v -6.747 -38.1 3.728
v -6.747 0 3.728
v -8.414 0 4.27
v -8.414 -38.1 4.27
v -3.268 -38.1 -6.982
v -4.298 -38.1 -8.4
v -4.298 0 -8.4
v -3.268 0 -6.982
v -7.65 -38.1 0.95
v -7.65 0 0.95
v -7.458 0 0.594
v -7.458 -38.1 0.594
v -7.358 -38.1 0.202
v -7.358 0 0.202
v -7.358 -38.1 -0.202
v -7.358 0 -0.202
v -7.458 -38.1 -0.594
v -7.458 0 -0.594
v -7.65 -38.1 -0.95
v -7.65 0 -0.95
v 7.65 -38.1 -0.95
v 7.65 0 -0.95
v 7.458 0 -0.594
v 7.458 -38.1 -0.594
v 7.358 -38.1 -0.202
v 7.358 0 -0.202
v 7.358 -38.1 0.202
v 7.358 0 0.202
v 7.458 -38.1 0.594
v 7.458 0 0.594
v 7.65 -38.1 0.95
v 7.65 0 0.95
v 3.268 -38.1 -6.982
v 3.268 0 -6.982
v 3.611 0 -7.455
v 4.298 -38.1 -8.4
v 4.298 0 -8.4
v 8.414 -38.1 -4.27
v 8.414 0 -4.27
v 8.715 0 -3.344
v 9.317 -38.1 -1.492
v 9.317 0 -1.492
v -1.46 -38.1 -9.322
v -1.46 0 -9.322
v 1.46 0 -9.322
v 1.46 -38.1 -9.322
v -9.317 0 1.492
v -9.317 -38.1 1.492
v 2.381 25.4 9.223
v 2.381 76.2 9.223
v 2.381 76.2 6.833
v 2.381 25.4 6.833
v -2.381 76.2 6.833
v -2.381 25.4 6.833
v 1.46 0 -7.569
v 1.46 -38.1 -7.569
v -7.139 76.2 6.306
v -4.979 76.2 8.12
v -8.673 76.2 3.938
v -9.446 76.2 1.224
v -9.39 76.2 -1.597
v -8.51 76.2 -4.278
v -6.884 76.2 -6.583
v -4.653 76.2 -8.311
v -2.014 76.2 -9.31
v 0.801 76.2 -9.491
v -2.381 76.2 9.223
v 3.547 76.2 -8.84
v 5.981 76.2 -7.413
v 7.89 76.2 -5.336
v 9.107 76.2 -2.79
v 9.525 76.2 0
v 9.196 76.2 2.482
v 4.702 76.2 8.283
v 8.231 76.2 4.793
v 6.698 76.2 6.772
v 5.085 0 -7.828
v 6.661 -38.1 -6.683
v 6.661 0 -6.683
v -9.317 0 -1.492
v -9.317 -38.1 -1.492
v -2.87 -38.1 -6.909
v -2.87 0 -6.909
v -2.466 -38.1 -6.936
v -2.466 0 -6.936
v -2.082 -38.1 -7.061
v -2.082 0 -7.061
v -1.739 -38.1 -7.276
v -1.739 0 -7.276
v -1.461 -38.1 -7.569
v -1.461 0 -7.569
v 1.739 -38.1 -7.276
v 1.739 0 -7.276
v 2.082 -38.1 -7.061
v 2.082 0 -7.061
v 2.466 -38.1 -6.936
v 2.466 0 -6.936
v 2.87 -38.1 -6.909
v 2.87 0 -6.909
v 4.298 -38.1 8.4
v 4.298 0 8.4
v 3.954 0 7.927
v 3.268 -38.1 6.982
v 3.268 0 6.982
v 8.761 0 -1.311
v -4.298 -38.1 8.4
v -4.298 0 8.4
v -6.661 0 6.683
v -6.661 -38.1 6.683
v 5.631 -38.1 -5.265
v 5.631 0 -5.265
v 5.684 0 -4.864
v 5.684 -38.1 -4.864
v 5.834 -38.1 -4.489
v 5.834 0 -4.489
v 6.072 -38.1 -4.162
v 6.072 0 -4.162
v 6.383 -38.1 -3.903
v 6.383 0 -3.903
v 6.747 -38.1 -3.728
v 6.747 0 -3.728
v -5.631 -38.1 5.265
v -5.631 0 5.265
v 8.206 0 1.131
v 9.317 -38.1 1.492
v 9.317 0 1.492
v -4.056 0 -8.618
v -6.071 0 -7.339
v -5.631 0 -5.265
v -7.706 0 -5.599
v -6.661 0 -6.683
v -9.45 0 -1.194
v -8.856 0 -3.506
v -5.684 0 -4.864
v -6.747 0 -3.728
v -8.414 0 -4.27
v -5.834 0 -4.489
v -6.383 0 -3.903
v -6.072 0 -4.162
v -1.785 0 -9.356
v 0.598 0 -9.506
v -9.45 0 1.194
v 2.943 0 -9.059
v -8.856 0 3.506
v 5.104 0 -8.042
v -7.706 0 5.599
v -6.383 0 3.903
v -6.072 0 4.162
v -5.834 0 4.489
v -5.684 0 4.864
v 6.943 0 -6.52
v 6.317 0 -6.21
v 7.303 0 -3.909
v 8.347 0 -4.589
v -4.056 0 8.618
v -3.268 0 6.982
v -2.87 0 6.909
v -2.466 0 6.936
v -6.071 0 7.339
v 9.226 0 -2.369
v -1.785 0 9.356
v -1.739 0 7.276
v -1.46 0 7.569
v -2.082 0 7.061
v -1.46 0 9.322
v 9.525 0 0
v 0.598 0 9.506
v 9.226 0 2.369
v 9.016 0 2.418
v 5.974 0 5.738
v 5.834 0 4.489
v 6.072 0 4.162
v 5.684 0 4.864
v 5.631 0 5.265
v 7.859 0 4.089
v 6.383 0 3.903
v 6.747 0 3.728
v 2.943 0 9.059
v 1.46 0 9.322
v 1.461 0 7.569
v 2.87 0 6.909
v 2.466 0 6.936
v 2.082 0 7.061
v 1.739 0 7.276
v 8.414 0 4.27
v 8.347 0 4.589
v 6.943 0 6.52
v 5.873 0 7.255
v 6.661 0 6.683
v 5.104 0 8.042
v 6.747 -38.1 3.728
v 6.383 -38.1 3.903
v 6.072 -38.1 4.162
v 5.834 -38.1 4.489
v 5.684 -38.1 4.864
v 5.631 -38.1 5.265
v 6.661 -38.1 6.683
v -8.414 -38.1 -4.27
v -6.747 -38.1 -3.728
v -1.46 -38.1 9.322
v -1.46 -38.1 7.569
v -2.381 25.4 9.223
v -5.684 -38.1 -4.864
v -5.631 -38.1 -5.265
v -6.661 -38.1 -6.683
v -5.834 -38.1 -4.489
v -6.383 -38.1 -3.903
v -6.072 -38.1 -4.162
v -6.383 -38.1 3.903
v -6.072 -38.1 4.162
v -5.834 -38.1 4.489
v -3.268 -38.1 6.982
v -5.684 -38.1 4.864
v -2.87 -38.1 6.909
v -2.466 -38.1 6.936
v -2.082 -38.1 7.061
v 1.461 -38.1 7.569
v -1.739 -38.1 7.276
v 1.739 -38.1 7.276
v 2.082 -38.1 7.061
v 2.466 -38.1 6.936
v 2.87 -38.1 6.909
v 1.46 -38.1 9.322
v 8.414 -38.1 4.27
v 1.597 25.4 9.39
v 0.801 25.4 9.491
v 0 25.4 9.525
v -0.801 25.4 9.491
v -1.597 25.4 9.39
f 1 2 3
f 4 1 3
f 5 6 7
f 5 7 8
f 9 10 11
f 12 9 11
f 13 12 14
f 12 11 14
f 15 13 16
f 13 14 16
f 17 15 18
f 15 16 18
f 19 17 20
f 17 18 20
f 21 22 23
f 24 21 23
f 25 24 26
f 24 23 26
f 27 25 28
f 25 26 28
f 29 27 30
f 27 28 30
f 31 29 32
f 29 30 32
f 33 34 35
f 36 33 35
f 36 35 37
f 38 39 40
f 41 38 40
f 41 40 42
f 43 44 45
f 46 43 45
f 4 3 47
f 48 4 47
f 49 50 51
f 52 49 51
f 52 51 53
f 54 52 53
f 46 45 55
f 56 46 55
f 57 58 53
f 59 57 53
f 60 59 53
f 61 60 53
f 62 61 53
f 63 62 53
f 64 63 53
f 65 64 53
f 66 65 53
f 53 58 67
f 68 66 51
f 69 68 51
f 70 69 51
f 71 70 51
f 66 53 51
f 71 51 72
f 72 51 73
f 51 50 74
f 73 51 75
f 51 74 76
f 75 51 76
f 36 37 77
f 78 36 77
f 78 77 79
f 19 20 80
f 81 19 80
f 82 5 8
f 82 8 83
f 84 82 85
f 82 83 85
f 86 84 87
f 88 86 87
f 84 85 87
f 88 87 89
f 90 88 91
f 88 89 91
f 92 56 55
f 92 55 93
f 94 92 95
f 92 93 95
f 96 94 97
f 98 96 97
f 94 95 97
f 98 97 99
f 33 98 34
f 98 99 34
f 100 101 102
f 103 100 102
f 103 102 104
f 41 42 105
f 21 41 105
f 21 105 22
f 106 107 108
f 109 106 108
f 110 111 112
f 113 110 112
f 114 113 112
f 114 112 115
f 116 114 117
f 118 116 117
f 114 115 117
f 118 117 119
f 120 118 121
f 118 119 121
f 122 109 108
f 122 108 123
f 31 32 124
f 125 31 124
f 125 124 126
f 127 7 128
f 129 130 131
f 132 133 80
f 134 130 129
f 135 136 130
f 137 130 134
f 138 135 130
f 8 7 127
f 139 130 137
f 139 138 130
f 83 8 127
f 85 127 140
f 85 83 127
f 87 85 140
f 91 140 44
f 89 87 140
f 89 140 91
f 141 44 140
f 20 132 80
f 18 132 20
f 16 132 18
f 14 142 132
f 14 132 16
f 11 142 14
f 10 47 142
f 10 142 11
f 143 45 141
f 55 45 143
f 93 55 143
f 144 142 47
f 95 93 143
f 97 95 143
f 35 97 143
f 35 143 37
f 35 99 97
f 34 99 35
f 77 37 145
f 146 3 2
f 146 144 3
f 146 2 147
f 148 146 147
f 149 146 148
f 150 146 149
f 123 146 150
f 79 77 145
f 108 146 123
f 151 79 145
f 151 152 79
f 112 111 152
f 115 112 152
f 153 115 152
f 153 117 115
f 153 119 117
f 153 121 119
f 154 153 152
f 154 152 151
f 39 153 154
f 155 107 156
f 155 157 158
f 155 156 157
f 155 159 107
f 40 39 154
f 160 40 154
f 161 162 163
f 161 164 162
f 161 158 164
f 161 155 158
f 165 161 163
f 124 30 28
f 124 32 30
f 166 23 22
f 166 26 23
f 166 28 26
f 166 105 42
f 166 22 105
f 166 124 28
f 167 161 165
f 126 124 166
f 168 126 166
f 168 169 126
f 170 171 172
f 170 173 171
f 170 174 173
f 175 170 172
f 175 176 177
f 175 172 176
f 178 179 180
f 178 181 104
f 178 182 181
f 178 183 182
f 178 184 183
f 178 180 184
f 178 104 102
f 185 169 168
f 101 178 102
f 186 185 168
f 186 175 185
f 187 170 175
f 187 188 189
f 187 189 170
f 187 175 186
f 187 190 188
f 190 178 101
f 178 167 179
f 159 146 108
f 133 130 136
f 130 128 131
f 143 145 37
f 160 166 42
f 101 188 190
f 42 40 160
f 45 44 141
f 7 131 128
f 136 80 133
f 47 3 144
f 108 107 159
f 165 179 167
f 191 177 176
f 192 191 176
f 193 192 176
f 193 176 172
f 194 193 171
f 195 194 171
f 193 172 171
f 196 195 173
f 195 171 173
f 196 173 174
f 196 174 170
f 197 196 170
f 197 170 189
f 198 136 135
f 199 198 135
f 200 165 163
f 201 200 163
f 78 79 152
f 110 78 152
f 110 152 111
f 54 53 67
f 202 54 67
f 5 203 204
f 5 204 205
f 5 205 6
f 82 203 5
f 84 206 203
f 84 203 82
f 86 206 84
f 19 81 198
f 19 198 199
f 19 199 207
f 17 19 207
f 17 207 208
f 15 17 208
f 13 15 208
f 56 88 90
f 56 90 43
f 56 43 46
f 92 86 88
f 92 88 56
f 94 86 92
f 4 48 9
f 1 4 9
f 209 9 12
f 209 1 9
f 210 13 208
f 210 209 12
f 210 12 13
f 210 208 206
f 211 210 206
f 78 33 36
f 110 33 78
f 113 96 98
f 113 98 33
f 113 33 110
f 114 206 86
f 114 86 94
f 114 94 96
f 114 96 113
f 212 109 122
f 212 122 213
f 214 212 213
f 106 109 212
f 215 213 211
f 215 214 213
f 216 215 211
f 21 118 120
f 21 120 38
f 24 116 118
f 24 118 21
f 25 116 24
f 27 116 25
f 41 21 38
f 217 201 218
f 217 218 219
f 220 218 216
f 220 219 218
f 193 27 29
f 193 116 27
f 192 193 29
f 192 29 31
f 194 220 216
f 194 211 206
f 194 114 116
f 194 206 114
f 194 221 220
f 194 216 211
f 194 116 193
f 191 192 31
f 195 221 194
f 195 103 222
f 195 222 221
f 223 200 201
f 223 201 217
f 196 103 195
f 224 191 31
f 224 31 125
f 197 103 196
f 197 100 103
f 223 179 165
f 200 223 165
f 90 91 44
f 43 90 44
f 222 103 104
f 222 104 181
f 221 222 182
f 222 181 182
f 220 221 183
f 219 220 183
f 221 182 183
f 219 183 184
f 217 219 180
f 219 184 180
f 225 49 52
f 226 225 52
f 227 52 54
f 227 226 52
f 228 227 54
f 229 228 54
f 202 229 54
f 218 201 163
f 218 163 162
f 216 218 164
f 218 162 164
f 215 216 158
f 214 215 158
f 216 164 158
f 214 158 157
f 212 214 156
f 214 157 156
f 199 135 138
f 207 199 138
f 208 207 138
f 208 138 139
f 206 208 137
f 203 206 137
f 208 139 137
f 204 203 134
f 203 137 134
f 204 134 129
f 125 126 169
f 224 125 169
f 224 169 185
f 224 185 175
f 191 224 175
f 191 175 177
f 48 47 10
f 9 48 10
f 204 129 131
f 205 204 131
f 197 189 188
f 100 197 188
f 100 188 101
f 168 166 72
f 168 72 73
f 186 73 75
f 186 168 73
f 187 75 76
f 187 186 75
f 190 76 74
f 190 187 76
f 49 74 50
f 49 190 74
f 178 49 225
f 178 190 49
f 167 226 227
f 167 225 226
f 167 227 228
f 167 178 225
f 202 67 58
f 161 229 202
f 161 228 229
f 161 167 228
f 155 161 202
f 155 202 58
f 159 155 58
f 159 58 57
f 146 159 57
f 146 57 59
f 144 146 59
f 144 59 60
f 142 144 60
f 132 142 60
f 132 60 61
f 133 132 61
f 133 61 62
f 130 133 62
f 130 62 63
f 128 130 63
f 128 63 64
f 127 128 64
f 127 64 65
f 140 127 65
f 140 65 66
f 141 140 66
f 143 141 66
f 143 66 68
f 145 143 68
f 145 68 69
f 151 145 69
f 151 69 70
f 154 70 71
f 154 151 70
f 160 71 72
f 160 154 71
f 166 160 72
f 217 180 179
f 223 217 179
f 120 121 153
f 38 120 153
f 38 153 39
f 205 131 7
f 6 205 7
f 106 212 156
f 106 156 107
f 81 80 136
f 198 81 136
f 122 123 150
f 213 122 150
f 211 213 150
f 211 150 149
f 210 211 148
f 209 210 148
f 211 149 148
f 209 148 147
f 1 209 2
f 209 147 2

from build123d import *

# Parameters (mm, degrees)
F1_DEPTH = 38.1
F2_R     = 9.525
F3_DEPTH = 76.2
F5_DEPTH = 50.8


# Not quite as in the source:
# - a feature names something its author has since deleted; it is built from what else it names


with BuildPart() as f1:
    # F0 (on Front) → F1 (new body)
    with BuildSketch(Plane.XZ):
        with BuildLine():
            Line((1.4605, 7.5692852344), (1.4605, 9.3218852344))
            Line((1.4605, 9.3218852344), (-1.4605, 9.3218852344))
            Line((-1.4605, 9.3218852344), (-1.4605, 7.5692852344))
            ThreePointArc((-1.4605, 7.5692852344), (-2.2699762391, 6.9862685009), (-3.2675449109, 6.9821407509))
            Line((-3.2675449109, 6.9821407509), (-4.2976973441, 8.4000239352))
            Line((-4.2976973441, 8.4000239352), (-6.6608359846, 6.6831032133))
            Line((-6.6608359846, 6.6831032133), (-5.6306835515, 5.2652200289))
            ThreePointArc((-5.6306835515, 5.2652200289), (-5.9428749476, 4.3177513881), (-6.7474987256, 3.7280558148))
            Line((-6.7474987256, 3.7280558148), (-8.4143203761, 4.2696389991))
            Line((-8.4143203761, 4.2696389991), (-9.3169590166, 1.491602915))
            Line((-9.3169590166, 1.491602915), (-7.6501373662, 0.9500197307))
            ThreePointArc((-7.6501373662, 0.9500197307), (-7.3457974171, 0), (-7.6501373662, -0.9500197307))
            Line((-7.6501373662, -0.9500197307), (-9.3169590166, -1.491602915))
            Line((-9.3169590166, -1.491602915), (-8.4143203761, -4.2696389991))
            Line((-8.4143203761, -4.2696389991), (-6.7474987256, -3.7280558148))
            ThreePointArc((-6.7474987256, -3.7280558148), (-5.9428749476, -4.3177513881), (-5.6306835515, -5.2652200289))
            Line((-5.6306835515, -5.2652200289), (-6.6608359846, -6.6831032133))
            Line((-6.6608359846, -6.6831032133), (-4.2976973441, -8.4000239352))
            Line((-4.2976973441, -8.4000239352), (-3.2675449109, -6.9821407509))
            ThreePointArc((-3.2675449109, -6.9821407509), (-2.2699762391, -6.9862685009), (-1.4605, -7.5692852344))
            Line((-1.4605, -7.5692852344), (-1.4605, -9.3218852344))
            Line((-1.4605, -9.3218852344), (1.4605, -9.3218852344))
            Line((1.4605, -9.3218852344), (1.4605, -7.5692852344))
            ThreePointArc((1.4605, -7.5692852344), (2.2699762391, -6.9862685009), (3.2675449109, -6.9821407509))
            Line((3.2675449109, -6.9821407509), (4.2976973441, -8.4000239352))
            Line((4.2976973441, -8.4000239352), (6.6608359846, -6.6831032133))
            Line((6.6608359846, -6.6831032133), (5.6306835515, -5.2652200289))
            ThreePointArc((5.6306835515, -5.2652200289), (5.9428749476, -4.3177513881), (6.7474987256, -3.7280558148))
            Line((6.7474987256, -3.7280558148), (8.4143203761, -4.2696389991))
            Line((8.4143203761, -4.2696389991), (9.3169590166, -1.491602915))
            Line((9.3169590166, -1.491602915), (7.6501373662, -0.9500197307))
            ThreePointArc((7.6501373662, -0.9500197307), (7.3457974171, 0), (7.6501373662, 0.9500197307))
            Line((7.6501373662, 0.9500197307), (9.3169590166, 1.491602915))
            Line((9.3169590166, 1.491602915), (8.4143203761, 4.2696389991))
            Line((8.4143203761, 4.2696389991), (6.7474987256, 3.7280558148))
            ThreePointArc((6.7474987256, 3.7280558148), (5.9428749476, 4.3177513881), (5.6306835515, 5.2652200289))
            Line((5.6306835515, 5.2652200289), (6.6608359846, 6.6831032133))
            Line((6.6608359846, 6.6831032133), (4.2976973441, 8.4000239352))
            Line((4.2976973441, 8.4000239352), (3.2675449109, 6.9821407509))
            ThreePointArc((3.2675449109, 6.9821407509), (2.2699762391, 6.9862685009), (1.4605, 7.5692852344))
        make_face()
    extrude(amount=F1_DEPTH)

    # F2 (on Front) → F3 (join)
    with BuildSketch(Plane.XZ):
        Circle(F2_R)
    extrude(amount=-F3_DEPTH)

    # F4 (on face) → F5 (cut)
    with BuildSketch(Plane(origin=(0, 76.2, 0), x_dir=(-1, 0, 0), z_dir=(0, 1, 0))):
        with BuildLine():
            ThreePointArc((2.38125, 9.2225415932), (1.2001908859, 9.4490828569), (0, 9.525))
            ThreePointArc((0, 9.525), (-1.2001908859, 9.4490828569), (-2.38125, 9.2225415932))
            Line((-2.38125, 9.2225415932), (-2.38125, 6.8326))
            Line((-2.38125, 6.8326), (2.38125, 6.8326))
            Line((2.38125, 6.8326), (2.38125, 9.2225415932))
        make_face()
    extrude(amount=-F5_DEPTH, mode=Mode.SUBTRACT)


solid = f1.part
